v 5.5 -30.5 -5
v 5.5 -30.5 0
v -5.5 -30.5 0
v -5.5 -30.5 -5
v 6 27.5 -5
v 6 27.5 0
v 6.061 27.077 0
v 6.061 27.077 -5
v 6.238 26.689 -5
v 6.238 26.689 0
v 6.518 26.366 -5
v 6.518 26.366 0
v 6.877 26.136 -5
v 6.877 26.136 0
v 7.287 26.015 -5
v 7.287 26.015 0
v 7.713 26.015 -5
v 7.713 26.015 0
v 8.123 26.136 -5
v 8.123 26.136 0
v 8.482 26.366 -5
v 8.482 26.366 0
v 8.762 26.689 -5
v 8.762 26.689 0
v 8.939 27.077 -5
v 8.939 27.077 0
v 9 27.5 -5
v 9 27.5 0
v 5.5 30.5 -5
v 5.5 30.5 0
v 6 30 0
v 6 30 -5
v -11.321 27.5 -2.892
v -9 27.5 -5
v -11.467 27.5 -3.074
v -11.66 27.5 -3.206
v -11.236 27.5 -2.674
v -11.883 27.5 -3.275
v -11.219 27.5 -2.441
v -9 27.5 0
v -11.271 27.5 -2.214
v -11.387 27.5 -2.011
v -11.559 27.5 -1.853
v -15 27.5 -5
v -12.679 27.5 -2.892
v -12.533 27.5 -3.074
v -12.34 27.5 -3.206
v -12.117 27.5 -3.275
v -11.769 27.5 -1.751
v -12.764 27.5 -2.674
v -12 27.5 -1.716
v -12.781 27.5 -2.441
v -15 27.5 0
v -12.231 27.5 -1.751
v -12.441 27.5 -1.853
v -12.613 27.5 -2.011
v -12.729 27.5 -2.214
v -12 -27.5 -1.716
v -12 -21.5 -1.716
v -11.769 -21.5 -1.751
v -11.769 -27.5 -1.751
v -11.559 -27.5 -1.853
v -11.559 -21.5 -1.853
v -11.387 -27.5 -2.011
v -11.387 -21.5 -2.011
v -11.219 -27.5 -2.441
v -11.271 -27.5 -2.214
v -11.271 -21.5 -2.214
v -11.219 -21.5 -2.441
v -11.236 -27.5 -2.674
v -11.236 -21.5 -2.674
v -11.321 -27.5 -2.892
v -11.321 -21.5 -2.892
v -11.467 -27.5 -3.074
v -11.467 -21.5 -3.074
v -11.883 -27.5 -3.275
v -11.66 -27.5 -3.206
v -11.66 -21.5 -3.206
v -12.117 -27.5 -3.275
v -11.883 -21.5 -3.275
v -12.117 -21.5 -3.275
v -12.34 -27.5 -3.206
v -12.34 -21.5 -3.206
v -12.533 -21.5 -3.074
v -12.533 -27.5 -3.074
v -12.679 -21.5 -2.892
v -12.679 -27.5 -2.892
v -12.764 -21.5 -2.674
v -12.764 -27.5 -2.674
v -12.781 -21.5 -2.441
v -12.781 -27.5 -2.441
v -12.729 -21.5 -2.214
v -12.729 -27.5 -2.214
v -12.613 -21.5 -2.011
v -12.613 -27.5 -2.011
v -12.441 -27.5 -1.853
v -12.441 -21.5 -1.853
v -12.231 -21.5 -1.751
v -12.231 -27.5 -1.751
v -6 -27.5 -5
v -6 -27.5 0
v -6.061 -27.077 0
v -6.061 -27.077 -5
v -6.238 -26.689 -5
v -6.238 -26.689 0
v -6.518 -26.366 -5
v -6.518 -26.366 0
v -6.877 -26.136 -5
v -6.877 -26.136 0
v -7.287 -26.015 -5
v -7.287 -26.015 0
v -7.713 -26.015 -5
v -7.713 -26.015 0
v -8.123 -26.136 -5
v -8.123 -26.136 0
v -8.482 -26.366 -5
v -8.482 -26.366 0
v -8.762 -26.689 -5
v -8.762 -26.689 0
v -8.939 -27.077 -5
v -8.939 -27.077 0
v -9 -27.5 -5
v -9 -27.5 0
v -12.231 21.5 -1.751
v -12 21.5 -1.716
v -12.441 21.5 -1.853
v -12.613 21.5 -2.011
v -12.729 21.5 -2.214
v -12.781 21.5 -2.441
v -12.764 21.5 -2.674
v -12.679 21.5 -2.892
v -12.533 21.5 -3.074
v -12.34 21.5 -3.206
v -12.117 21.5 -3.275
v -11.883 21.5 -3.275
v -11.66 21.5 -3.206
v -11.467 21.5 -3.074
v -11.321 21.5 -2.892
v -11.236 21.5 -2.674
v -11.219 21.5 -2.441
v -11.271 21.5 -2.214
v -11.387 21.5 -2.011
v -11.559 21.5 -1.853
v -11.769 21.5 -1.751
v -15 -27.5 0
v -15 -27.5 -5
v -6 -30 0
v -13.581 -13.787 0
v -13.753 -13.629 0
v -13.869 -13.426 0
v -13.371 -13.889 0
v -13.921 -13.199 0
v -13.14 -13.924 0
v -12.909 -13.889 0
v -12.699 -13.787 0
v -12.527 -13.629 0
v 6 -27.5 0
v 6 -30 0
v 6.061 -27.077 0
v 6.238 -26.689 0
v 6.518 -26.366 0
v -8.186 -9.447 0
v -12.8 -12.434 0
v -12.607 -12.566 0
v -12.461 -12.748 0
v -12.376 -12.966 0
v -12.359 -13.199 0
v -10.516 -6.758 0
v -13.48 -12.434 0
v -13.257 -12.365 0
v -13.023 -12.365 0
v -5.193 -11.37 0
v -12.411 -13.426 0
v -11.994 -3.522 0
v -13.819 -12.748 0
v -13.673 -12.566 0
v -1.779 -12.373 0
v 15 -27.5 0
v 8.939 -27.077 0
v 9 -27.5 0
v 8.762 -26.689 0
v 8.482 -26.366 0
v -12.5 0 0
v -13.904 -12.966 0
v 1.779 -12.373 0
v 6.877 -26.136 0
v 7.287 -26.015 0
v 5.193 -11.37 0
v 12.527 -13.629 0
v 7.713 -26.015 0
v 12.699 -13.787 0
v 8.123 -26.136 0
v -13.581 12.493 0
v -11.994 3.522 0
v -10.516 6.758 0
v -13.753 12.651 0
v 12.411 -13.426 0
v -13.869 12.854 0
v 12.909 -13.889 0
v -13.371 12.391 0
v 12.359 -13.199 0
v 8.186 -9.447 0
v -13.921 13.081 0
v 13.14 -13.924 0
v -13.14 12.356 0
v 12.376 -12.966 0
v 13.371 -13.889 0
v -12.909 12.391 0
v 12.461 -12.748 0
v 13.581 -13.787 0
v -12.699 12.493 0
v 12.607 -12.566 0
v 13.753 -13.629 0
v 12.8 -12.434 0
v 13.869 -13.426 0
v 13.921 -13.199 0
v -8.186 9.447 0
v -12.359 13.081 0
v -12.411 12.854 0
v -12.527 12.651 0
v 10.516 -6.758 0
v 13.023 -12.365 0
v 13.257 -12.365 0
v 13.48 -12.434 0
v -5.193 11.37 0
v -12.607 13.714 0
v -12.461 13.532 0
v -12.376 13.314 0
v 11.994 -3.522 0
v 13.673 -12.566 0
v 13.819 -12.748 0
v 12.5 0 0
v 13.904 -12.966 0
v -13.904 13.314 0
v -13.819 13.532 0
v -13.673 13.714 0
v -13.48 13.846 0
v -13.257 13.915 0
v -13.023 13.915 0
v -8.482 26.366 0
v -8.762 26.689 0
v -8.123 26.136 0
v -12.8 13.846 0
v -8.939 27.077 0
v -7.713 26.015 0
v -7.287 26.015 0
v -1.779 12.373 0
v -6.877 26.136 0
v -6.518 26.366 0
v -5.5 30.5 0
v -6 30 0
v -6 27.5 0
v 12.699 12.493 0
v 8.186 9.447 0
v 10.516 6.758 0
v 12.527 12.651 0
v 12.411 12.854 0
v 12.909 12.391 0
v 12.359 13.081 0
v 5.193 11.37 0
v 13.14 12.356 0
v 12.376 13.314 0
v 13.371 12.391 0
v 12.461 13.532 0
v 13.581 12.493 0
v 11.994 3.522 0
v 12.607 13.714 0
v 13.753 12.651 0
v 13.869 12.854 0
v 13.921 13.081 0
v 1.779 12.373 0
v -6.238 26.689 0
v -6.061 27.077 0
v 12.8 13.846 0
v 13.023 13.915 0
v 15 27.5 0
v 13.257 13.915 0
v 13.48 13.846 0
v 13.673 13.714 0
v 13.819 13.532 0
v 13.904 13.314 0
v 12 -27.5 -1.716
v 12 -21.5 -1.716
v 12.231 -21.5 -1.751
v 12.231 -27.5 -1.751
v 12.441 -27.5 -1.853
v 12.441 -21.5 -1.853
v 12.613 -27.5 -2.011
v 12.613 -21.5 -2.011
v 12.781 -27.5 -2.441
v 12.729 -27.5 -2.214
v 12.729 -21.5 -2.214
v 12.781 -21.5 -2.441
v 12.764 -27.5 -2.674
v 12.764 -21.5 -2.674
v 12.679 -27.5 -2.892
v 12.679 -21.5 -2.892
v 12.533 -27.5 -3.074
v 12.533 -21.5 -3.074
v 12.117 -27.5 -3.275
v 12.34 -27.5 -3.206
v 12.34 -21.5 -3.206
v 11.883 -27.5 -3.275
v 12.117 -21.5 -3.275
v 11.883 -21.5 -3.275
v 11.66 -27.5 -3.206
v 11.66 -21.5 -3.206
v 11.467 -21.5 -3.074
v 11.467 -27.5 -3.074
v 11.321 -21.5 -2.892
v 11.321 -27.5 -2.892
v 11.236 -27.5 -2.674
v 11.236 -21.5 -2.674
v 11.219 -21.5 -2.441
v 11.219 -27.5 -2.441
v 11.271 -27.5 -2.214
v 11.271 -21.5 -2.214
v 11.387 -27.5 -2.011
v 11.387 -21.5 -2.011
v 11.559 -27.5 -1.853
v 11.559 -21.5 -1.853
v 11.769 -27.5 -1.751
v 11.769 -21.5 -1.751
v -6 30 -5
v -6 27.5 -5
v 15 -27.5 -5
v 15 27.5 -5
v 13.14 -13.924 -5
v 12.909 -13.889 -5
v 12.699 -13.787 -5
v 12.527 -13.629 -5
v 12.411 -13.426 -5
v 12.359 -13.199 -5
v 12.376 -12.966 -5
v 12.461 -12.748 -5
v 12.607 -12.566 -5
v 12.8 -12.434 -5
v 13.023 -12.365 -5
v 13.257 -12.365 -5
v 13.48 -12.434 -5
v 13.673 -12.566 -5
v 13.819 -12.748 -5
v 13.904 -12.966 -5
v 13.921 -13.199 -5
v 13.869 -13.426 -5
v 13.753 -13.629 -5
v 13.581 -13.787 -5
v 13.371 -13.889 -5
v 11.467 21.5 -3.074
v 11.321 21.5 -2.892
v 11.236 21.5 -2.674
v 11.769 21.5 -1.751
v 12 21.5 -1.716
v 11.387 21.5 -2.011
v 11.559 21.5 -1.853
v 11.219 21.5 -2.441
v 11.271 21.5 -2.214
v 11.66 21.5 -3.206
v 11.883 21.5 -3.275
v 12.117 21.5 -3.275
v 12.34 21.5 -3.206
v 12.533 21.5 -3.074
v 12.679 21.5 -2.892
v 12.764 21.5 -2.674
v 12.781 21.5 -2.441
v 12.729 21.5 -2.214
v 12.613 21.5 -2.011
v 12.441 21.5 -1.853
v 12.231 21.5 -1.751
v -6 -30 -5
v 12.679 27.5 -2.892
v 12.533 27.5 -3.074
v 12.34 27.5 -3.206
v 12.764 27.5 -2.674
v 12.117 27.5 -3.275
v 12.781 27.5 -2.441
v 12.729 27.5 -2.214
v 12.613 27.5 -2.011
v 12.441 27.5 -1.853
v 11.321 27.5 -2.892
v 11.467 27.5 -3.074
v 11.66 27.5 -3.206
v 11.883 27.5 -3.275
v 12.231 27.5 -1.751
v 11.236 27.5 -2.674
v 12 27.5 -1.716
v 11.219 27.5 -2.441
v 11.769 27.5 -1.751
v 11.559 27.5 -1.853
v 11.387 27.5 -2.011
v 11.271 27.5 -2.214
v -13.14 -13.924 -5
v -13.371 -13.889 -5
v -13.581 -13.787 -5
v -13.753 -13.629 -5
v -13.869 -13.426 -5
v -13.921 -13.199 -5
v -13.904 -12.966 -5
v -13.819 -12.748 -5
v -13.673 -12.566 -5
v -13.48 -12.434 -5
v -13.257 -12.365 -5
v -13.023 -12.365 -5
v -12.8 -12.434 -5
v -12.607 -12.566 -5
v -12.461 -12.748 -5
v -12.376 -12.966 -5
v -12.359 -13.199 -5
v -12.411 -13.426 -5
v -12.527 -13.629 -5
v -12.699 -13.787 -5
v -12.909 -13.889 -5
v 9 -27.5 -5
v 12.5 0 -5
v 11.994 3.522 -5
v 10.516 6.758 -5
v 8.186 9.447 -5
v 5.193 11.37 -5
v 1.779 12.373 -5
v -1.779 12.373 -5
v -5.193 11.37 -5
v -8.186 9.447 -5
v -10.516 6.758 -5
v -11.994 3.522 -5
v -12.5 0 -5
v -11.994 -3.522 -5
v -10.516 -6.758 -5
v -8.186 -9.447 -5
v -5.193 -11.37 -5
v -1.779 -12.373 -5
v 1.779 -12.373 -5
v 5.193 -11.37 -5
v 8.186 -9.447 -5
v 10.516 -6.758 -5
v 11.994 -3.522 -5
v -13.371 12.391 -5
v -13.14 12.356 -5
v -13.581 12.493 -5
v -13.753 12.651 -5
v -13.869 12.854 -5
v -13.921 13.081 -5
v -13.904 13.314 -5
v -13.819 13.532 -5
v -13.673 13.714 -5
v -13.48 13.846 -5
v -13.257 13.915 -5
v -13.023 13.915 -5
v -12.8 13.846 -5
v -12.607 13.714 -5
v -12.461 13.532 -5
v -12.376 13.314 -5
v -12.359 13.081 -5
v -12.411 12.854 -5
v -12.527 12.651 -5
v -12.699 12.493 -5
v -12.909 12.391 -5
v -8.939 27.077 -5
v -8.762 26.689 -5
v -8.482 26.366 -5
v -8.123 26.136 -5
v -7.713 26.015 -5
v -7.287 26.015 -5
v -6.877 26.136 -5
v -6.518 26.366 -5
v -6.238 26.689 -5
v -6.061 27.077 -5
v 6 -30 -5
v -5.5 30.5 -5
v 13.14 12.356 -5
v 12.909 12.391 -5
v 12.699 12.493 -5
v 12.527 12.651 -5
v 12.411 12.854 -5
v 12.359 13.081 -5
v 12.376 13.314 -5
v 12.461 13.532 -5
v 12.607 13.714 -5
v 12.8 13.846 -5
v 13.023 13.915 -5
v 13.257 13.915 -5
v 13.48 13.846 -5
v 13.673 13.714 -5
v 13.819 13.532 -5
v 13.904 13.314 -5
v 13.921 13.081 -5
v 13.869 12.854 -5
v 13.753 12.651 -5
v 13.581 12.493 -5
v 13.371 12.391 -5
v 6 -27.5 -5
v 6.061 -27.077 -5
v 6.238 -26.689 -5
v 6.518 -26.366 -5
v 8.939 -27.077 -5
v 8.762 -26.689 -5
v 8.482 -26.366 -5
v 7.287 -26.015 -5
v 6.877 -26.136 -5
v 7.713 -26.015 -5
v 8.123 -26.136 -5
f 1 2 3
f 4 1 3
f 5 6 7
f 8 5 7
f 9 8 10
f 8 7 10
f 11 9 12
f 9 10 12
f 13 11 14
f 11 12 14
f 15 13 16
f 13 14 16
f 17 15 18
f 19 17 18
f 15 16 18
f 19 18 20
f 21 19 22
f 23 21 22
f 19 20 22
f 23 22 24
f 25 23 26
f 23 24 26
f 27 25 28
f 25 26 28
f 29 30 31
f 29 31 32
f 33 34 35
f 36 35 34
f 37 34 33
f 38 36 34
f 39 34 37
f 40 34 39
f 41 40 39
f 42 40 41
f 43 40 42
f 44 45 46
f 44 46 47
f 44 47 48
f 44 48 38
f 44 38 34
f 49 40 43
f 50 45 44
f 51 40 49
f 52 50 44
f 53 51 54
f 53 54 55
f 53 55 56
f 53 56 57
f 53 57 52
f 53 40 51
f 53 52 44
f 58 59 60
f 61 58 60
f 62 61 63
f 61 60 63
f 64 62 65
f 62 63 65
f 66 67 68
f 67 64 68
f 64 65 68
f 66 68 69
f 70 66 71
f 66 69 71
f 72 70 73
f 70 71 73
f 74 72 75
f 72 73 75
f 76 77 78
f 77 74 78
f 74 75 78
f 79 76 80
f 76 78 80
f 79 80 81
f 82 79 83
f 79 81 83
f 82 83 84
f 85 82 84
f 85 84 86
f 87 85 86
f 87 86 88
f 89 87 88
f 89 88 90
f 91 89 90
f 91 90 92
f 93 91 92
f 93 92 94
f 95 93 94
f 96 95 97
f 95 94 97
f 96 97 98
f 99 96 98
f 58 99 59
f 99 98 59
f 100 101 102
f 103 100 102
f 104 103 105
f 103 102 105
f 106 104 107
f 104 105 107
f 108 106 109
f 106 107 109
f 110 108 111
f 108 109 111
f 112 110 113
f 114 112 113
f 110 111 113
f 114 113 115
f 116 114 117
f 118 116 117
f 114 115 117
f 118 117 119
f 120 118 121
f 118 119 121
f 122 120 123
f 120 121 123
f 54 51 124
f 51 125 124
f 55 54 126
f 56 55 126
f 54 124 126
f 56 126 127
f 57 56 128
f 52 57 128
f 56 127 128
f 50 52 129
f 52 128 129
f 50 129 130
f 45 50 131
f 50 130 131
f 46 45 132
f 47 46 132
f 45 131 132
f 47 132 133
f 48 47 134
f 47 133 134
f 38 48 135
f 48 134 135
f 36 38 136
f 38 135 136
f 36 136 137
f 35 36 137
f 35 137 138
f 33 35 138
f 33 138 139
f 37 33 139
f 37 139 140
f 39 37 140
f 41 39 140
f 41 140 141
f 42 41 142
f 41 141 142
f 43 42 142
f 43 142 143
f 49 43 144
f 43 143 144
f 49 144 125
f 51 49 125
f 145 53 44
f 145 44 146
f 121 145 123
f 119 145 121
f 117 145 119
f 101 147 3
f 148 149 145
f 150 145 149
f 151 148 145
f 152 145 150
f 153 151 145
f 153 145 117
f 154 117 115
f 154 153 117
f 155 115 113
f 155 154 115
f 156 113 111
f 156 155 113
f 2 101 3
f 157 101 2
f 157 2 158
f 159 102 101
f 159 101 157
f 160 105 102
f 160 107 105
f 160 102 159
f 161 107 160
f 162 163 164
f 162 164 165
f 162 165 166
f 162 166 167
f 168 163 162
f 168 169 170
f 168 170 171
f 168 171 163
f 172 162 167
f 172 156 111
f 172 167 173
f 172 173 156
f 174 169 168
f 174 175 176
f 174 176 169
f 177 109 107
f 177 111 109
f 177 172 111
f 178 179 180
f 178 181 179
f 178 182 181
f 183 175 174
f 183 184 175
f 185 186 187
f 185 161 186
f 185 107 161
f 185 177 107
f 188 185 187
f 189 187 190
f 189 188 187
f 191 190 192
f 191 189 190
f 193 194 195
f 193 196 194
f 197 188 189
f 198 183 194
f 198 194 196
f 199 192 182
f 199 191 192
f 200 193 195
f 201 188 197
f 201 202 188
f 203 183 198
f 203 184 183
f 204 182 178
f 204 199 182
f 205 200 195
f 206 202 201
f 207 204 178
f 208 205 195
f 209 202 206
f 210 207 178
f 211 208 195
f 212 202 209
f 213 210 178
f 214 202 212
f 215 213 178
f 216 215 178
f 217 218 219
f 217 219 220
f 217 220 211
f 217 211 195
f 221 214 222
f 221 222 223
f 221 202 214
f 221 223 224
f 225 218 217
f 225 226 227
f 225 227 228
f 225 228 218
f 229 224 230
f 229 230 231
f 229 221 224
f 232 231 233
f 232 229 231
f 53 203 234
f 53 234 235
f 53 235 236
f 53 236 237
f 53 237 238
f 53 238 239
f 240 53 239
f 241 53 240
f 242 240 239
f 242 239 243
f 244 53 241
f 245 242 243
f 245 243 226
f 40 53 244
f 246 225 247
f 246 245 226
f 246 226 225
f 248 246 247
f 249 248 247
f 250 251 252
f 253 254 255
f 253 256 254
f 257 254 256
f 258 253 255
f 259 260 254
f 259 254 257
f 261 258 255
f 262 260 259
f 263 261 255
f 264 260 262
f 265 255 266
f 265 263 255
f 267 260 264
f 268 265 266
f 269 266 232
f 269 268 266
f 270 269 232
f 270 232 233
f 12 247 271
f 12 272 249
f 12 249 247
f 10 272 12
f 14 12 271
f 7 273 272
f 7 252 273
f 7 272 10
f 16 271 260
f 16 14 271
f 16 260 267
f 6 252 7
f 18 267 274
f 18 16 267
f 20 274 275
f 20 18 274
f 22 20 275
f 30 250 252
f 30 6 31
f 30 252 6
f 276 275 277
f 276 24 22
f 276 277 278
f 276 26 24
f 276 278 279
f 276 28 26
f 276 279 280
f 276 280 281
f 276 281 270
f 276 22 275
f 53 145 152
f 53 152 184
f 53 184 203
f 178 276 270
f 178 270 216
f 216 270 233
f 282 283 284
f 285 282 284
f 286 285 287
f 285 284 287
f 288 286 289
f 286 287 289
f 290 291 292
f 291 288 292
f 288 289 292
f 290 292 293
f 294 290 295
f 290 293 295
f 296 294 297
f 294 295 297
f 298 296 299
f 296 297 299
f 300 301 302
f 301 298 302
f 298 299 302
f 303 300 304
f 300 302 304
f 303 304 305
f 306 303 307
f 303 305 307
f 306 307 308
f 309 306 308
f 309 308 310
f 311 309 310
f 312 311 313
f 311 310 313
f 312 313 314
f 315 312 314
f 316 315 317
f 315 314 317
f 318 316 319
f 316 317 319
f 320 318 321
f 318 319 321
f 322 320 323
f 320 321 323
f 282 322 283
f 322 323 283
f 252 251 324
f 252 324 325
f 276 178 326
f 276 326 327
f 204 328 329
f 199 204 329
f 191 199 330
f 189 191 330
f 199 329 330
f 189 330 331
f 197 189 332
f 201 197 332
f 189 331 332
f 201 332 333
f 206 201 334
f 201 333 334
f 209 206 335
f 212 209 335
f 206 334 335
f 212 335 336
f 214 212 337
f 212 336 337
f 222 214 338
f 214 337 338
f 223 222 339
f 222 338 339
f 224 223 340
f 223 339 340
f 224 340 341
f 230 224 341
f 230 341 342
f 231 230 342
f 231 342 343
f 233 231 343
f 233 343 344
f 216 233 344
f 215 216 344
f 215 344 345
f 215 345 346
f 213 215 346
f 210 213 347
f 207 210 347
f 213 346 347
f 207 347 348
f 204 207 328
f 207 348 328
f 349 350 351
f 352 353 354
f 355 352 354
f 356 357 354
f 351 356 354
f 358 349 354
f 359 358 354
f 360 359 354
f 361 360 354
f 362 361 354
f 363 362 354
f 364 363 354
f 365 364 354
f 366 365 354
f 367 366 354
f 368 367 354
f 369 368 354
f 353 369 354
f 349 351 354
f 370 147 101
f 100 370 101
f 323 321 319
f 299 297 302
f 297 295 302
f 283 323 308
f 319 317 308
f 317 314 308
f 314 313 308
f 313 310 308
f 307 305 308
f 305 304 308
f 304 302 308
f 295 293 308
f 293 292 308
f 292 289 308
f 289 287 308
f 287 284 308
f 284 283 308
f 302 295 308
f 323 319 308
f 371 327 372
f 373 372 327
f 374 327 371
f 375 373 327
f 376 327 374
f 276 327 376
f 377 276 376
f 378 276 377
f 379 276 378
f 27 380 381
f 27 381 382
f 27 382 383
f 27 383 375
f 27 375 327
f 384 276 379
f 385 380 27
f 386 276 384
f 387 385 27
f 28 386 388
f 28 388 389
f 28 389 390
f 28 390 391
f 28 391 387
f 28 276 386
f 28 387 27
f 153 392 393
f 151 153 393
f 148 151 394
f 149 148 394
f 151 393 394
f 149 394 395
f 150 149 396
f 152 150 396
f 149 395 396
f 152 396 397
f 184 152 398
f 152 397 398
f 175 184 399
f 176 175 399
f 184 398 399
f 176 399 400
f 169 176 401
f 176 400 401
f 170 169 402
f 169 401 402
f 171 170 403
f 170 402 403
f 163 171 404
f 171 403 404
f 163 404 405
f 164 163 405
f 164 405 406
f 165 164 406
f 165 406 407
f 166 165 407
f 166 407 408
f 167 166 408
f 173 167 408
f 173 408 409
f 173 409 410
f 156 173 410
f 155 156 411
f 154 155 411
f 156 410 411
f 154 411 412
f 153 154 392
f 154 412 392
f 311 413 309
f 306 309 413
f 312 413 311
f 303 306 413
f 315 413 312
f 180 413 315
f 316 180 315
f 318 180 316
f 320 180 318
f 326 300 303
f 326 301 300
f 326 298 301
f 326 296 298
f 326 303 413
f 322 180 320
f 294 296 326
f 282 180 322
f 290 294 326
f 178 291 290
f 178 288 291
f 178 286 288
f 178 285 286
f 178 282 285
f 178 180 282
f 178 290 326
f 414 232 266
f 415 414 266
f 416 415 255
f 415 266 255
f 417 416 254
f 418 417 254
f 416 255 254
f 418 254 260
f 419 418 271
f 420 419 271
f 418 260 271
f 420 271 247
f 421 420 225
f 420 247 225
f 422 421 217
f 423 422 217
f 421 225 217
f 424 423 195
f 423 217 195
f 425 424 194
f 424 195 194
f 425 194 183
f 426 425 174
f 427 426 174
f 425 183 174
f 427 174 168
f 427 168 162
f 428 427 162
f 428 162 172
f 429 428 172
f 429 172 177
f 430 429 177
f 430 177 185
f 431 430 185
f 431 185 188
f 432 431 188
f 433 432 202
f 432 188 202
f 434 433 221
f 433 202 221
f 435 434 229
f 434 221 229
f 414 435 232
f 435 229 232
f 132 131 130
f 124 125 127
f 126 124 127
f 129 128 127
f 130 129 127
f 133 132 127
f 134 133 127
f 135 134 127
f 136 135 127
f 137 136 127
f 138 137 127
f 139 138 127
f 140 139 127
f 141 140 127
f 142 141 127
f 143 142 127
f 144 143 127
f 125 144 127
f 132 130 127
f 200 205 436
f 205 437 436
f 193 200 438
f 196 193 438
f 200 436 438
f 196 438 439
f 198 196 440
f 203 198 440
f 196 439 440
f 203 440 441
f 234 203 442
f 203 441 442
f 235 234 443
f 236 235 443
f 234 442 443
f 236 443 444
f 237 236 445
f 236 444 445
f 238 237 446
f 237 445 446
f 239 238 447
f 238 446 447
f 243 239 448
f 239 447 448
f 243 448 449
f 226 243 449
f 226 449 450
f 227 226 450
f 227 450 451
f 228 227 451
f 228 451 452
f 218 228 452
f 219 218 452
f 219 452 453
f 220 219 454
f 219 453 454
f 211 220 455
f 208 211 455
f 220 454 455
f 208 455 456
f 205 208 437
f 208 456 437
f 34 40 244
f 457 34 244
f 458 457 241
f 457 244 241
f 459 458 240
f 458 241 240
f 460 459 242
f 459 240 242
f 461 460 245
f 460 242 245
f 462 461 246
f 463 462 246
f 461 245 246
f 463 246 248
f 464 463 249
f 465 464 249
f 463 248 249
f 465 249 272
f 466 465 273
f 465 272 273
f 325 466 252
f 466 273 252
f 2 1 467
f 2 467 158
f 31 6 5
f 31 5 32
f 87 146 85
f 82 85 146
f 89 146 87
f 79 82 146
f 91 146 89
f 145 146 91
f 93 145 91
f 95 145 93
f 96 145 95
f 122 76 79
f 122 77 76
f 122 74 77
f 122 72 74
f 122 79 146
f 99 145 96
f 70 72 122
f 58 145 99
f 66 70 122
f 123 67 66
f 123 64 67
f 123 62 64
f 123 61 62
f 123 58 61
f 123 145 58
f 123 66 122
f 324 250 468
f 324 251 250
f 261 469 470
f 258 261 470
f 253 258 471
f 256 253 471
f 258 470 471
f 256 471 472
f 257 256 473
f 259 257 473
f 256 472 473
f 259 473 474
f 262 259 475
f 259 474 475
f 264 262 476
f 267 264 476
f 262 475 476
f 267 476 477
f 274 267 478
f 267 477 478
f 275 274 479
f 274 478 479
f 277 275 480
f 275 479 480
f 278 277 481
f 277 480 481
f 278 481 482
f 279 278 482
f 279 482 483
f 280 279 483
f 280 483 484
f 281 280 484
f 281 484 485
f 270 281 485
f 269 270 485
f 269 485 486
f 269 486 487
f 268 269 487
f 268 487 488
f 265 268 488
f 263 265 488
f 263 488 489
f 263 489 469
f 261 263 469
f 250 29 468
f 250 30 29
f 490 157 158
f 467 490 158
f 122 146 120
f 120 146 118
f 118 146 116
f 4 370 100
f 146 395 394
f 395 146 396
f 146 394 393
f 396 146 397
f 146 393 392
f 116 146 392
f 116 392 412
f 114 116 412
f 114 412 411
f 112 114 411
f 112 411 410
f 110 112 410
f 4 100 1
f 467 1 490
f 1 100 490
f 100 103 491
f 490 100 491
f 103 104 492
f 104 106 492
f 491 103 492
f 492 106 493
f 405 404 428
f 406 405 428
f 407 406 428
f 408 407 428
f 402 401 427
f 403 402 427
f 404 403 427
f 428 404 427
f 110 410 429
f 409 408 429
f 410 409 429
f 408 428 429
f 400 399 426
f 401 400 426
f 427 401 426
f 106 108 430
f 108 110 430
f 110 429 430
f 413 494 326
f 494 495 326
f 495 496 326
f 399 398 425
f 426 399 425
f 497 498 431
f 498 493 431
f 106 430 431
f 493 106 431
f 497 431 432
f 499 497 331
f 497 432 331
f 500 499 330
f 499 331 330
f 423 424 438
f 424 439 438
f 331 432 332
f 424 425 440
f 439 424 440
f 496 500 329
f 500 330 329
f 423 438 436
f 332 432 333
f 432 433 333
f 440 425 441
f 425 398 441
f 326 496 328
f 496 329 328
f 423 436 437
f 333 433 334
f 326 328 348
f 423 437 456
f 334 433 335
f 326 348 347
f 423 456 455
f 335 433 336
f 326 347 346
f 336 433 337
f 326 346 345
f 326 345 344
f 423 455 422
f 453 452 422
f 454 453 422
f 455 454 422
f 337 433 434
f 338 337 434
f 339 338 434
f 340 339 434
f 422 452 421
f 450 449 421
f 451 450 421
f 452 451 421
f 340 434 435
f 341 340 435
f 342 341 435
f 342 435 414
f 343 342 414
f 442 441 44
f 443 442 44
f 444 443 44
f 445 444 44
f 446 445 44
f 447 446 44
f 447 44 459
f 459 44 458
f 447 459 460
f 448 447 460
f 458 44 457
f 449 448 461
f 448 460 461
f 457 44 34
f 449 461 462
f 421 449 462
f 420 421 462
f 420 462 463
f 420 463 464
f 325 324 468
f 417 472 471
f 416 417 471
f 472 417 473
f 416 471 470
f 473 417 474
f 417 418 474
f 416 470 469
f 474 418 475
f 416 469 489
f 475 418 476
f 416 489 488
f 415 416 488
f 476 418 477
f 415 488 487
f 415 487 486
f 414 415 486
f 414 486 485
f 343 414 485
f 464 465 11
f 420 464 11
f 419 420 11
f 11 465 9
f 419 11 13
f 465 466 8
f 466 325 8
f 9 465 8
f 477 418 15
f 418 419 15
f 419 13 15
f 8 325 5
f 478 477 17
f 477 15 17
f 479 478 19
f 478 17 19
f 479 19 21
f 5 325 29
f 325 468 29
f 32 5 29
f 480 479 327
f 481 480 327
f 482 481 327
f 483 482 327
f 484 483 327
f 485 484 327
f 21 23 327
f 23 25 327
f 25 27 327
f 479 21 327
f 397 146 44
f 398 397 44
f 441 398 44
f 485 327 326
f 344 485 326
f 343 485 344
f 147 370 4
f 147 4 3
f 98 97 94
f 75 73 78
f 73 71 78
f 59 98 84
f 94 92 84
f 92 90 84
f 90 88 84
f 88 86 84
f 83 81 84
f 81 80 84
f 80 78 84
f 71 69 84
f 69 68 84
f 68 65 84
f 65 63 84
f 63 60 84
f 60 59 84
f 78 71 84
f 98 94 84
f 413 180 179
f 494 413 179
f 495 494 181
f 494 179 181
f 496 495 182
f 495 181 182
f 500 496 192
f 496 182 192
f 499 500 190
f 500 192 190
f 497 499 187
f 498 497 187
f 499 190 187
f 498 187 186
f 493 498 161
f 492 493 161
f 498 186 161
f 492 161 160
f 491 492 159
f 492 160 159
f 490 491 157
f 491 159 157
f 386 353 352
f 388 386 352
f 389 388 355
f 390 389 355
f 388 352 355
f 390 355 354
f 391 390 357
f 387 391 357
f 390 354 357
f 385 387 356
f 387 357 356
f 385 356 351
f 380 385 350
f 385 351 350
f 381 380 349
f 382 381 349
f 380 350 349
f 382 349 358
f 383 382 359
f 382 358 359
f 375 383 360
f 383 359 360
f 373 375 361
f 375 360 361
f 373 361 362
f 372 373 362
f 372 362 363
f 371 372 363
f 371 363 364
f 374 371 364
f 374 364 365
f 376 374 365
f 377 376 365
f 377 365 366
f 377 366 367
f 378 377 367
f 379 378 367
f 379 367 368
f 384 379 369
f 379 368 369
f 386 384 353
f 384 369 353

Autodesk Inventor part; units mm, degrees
ref_plane "YZ Plane" through (0, 0, 0) normal (1, 0, 0) x (0, 1, 0)
ref_plane "XZ Plane" through (0, 0, 0) normal (0, 1, 0) x (-1, 0, 0)
ref_plane "XY Plane" through (0, 0, 0) normal (0, 0, 1) x (1, 0, 0)
sketch "Sketch1" plane through (0, 0, 0) normal (0, 0, 1) x (1, 0, 0)
  line L0 (15, 27.5) -> (-15, 27.5)
  line L1 (-15, 27.5) -> (-15, -27.5)
  line L2 (-15, -27.5) -> (15, -27.5)
  line L3 (15, -27.5) -> (15, 27.5)
  line L4 (15, 27.5) -> (-15, -27.5) construction
  line L5 (-15, 27.5) -> (15, -27.5) construction
  line L6 (13.14, 13.14) -> (-13.14, 13.14) construction
  line L7 (-13.14, 13.14) -> (-13.14, -13.14) construction
  line L8 (-13.14, -13.14) -> (13.14, -13.14) construction
  line L9 (13.14, -13.14) -> (13.14, 13.14) construction
  line L10 (13.14, 13.14) -> (-13.14, -13.14) construction
  line L11 (-13.14, 13.14) -> (13.14, -13.14) construction
  line L12 (15, 15) -> (-15, 15) construction
  line L13 (-15, 15) -> (-15, -15) construction
  line L14 (-15, -15) -> (15, -15) construction
  line L15 (15, -15) -> (15, 15) construction
  line L16 (15, 15) -> (-15, -15) construction
  line L17 (-15, 15) -> (15, -15) construction
  line L18 (0, 27.5) -> (0, -27.5) construction
  line L19 (15, 0) -> (-15, 0) construction
  line L20 (6, 27.5) -> (6, 30.5)
  line L21 (6, 30.5) -> (-6, 30.5)
  line L22 (-6, 30.5) -> (-6, 27.5)
  arc A0 (-9, 27.5) -> (-6, 27.5) centre (-7.5, 27.5) ccw
  line L23 (-15.1, -15.1) -> (15.1, 15.1) construction
  line L24 (15.1, -15.1) -> (-15.1, 15.1) construction
  line L25 (6, -27.5) -> (6, -30.5)
  line L26 (6, -30.5) -> (-6, -30.5)
  line L27 (-6, -30.5) -> (-6, -27.5)
  arc A1 (-6, -27.5) -> (-9, -27.5) centre (-7.5, -27.5) ccw
  line L28 (-12, 27.5) -> (-12, 21.5) construction
  line L29 (0, 30.5) -> (0, 27.5) construction
  line L30 (12, 27.5) -> (12, 21.5) construction
  arc A2 (6, 27.5) -> (9, 27.5) centre (7.5, 27.5) ccw
  line L31 (12, -27.5) -> (12, -21.5) construction
  arc A3 (9, -27.5) -> (6, -27.5) centre (7.5, -27.5) ccw
  circle A4 centre (0, 0) radius 12.5
  point P0 (13.14, -13.14)
  point P1 (-9, -27.5)
  point P2 (6, 28)
  point P3 (6, -27.5)
  point P4 (-6, -27.5)
  point P5 (-6, -27.5)
  point P6 (6, -27.5)
  point P7 (9, -27.5)
  dimension "d0" = 26.28
  dimension "d1" = 26.28
  dimension "d2" = 30
  dimension "d3" = 30
  dimension "d19" = 3
  dimension "d20" = 12
  dimension "d37" = 55
  dimension "d40" = 6
  dimension "d41" = 6
  dimension "d50" = 12.5
  dimension "d57" = 30
  dimension "d60" = 1.5
  dimension "d62" = 25
extrude "Extrusion1" add sketch "Sketch1" against normal blind 5 contours L3 L2 A3 A1 L1 L0 A0 A2 | L0 L22 L21 L20 | L25 L26 L27 L2 | A4
extrude "Extrusion2" cut sketch "Sketch1" against normal through all contours A4
hole "M2" at (13.14, 13.14, 0) at (-13.14, 13.14, 0) at (-13.14, -13.14, 0) at (13.14, -13.14, 0) direction (0, 0, -1) diameter 1.567 end through all thread size "M2x0.4" class "6H" standard "ANSI Metric M Profile"
sketch "Sketch2" plane through (-15, 27.5, 0) normal (0, 1, 0) x (1, 0, 0)
  line L0 (3, 5) -> (3, 0)
  line L1 (30, 0) -> (0, 0) projected
  line L2 (27, 5) -> (27, 0)
  line L3 (24, 5) -> (30, 5) projected
  line L4 (0, 5) -> (6, 5) projected
  point P0 (15, 0)
  point P1 (6, 0)
  point P2 (3, 2.5)
  point P3 (3, 0)
  point P4 (27, 2.5)
  point P5 (27, 0)
hole "Side-M2" at (-12, 27.5, -2.5) at (12, 27.5, -2.5) direction (0, -1, 0) diameter 1.567 depth 6 thread size "M2x0.4" class "6H" standard "ANSI Metric M Profile"
mirror "Mirror1" about plane through (0, 0, 0) normal (0, 1, 0) of "Side-M2"
chamfer "C0.5" distance 0.5 angle 45 4 edges at (6, -30.5, -2.5) (-6, -30.5, -2.5) (6, 30.5, -2.5) (-6, 30.5, -2.5)
properties part number "HeadCameraMountFrame" material "Acetal Resin, Black"
